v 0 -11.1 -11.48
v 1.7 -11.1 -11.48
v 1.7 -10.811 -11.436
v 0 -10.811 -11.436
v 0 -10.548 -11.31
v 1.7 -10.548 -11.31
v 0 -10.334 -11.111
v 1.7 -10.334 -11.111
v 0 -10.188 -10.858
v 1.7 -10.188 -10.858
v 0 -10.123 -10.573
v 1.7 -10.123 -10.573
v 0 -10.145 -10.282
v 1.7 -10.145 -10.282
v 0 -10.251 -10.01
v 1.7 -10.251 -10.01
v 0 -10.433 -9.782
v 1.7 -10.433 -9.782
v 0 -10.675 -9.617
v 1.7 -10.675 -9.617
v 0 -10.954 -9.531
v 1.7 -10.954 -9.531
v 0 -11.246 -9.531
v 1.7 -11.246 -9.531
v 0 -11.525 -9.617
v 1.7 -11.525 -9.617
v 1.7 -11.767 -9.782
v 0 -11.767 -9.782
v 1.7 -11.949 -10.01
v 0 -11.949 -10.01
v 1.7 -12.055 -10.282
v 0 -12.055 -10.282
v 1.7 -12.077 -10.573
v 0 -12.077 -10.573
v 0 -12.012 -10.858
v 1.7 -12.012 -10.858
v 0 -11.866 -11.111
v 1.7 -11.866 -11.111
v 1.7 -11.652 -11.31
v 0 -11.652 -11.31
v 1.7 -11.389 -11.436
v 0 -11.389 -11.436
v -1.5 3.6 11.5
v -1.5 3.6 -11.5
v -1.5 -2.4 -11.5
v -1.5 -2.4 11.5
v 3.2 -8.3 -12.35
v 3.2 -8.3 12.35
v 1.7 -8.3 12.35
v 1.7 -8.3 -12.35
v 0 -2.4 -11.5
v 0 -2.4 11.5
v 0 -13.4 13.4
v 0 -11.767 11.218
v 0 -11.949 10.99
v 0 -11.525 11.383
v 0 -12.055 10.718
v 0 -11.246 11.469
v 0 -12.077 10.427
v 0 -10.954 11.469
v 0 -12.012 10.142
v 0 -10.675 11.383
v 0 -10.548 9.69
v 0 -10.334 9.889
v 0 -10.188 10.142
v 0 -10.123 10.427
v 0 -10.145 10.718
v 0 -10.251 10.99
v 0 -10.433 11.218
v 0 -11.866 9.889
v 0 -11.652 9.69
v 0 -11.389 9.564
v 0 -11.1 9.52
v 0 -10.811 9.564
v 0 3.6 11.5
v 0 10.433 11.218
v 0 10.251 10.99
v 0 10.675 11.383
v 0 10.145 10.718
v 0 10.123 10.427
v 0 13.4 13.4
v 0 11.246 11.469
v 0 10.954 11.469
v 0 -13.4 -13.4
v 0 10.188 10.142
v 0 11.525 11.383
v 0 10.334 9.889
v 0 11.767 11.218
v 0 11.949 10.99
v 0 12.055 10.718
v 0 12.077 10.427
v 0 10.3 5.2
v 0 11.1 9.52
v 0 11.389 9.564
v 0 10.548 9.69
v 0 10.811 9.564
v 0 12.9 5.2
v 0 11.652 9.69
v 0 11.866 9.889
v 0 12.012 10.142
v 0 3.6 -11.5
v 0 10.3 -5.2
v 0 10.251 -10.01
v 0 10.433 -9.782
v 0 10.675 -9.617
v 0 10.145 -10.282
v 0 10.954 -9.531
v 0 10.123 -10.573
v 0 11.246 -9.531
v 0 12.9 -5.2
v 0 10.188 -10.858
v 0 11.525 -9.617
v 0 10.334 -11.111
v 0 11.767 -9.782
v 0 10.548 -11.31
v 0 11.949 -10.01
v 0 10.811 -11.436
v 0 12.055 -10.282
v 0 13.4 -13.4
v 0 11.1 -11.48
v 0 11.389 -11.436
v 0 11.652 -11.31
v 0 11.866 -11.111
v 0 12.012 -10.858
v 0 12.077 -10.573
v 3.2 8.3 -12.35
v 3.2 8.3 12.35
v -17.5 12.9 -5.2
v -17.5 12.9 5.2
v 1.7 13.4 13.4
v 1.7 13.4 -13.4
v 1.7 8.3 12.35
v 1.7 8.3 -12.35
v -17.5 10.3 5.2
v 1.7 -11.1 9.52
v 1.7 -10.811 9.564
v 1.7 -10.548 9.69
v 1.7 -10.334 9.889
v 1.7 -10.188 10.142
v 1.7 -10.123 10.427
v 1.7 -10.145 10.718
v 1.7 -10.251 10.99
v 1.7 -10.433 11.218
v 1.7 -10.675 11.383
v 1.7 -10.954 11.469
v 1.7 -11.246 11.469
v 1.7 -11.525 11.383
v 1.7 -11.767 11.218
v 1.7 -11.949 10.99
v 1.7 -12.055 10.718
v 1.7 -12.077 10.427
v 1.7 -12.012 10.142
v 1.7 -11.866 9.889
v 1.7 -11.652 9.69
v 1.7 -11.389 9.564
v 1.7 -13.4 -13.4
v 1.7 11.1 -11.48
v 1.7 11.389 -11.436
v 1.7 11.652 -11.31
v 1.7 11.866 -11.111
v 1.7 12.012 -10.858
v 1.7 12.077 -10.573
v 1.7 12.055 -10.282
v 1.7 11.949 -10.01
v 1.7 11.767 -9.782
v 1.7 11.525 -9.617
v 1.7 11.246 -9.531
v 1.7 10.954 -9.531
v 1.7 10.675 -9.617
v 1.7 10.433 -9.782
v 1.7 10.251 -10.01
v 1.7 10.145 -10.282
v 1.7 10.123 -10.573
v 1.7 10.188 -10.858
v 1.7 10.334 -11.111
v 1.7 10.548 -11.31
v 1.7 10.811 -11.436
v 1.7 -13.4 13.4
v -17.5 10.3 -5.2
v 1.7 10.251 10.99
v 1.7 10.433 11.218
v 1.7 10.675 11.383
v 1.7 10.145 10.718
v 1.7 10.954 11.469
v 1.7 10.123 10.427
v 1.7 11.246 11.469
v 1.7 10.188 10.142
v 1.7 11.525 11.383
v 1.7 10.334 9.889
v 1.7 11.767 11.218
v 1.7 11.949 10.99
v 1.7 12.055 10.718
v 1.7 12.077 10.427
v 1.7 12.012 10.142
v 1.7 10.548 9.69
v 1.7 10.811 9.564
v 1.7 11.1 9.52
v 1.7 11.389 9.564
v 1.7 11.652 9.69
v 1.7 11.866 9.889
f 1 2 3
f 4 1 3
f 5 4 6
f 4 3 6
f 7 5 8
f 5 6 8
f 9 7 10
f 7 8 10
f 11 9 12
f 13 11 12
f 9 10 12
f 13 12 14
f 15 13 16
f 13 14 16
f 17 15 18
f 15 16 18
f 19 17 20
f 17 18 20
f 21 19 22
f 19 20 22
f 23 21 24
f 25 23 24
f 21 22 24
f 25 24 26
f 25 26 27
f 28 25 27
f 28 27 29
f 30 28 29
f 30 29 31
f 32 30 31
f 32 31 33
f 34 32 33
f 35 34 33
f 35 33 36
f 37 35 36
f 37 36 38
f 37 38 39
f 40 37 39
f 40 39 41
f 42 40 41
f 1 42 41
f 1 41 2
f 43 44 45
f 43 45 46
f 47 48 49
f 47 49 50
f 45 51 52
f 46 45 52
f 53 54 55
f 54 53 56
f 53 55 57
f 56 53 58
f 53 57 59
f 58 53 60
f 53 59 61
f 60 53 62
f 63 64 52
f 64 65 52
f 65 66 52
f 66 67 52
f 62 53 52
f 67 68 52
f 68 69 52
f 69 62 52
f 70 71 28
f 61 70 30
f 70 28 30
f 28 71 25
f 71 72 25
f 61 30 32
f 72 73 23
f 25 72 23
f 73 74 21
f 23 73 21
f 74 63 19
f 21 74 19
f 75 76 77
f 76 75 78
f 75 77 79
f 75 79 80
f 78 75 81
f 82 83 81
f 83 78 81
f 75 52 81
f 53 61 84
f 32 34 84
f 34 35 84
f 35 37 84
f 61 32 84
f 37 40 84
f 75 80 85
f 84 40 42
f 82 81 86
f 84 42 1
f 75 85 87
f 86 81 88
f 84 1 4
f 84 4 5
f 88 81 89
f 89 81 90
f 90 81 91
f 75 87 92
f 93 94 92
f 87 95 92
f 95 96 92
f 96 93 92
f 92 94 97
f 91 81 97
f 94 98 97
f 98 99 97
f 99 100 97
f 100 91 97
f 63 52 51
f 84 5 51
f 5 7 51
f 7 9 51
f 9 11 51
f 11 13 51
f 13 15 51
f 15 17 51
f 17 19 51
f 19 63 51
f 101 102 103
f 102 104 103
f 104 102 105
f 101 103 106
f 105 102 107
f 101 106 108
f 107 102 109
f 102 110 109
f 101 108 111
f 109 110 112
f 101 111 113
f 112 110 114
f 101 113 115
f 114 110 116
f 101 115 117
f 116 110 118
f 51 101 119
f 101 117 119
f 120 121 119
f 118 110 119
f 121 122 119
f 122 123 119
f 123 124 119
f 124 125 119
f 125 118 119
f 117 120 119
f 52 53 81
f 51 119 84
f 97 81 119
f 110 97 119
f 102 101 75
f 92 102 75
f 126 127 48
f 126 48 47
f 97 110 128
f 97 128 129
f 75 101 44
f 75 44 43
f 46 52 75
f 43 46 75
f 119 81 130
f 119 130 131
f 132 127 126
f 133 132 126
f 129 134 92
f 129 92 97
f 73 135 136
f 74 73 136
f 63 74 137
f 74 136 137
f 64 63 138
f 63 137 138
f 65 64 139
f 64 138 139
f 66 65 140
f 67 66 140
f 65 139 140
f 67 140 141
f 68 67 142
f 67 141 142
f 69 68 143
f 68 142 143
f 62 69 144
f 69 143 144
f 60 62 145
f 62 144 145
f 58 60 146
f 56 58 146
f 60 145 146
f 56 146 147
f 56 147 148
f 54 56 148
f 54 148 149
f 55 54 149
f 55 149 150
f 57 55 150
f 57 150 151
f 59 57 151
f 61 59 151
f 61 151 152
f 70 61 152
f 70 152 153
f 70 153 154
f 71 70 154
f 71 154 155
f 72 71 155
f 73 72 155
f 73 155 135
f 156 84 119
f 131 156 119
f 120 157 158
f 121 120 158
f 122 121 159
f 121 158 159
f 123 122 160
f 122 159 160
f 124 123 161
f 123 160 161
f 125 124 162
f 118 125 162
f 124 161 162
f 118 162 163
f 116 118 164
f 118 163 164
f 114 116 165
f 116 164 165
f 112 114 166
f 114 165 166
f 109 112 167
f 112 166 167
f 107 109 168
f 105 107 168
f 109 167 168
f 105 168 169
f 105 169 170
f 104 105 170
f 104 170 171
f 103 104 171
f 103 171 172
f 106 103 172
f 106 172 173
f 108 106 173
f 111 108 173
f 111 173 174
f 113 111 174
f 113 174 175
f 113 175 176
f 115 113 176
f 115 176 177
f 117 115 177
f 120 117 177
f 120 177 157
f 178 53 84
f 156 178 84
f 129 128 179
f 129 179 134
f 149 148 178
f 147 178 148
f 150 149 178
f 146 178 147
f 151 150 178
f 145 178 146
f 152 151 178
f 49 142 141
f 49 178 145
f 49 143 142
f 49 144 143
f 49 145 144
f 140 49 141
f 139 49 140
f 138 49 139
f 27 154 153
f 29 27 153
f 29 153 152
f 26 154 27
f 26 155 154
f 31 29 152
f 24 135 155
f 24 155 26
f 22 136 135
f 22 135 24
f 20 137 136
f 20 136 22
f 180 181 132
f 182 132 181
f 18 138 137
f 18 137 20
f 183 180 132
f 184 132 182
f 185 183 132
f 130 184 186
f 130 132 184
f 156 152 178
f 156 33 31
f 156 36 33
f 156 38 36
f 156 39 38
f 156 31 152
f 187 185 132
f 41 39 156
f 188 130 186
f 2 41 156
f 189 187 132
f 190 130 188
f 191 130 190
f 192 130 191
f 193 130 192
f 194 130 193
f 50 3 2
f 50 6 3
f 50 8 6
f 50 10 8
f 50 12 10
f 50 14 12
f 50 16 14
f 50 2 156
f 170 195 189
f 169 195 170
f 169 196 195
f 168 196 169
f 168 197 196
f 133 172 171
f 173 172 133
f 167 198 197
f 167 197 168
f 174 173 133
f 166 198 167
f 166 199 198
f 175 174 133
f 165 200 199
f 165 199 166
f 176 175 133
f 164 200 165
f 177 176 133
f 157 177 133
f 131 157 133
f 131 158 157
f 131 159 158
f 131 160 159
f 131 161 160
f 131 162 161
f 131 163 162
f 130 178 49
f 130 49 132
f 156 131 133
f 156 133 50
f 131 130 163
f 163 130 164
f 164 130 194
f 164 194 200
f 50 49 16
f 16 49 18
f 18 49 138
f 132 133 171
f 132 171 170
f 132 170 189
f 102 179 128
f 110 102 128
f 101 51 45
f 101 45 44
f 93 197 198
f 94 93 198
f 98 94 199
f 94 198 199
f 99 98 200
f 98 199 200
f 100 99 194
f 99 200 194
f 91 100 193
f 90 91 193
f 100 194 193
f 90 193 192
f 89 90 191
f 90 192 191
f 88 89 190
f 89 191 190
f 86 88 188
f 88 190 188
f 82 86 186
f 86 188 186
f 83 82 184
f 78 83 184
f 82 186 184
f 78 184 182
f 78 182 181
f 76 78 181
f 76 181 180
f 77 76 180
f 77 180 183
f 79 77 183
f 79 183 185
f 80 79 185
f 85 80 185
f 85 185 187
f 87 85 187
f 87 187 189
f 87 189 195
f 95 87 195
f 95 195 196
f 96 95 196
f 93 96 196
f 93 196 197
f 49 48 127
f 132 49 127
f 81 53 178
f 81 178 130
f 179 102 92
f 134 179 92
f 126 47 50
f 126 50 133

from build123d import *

# Parameters (mm, degrees)
SKETCH_1_W          = 26.8
SKETCH_1_H          = 26.8
EXTRUDE_1_DEPTH     = 3.2
SKETCH_2_W          = 26.8
SKETCH_2_H          = 26.8
SKETCH_2_W_2        = 24.7
SKETCH_2_H_2        = 16.6
CUT_EXTRUDE_1_DEPTH = 1.5
SKETCH_3_W          = 10.4
SKETCH_3_H          = 2.6
EXTRUDE_2_DEPTH     = 17.5
SKETCH_4_W          = 23
SKETCH_4_H          = 6
EXTRUDE_3_DEPTH     = 1.5
SKETCH_5_R          = 0.98
CUT_EXTRUDE_2_DEPTH = 10


with BuildPart() as part:
    # 草图1 → 凸台-拉伸1 (new body)
    with BuildSketch(Plane(origin=(0, 0, 0), x_dir=(0, 0, -1), z_dir=(1, 0, 0))):
        Rectangle(SKETCH_1_W, SKETCH_1_H)
    extrude(amount=EXTRUDE_1_DEPTH)

    # 草图2 → 切除-拉伸1 (cut)
    with BuildSketch(Plane(origin=(3.2, 0, 0), x_dir=(0, 0, -1), z_dir=(1, 0, 0))):
        Rectangle(SKETCH_2_W, SKETCH_2_H)
        Rectangle(SKETCH_2_W_2, SKETCH_2_H_2, mode=Mode.SUBTRACT)
    extrude(amount=-CUT_EXTRUDE_1_DEPTH, mode=Mode.SUBTRACT)

    # 草图3 → 凸台-拉伸2 (add)
    with BuildSketch(Plane.ZY):
        with Locations((0, 11.6)):
            Rectangle(SKETCH_3_W, SKETCH_3_H)
    extrude(amount=EXTRUDE_2_DEPTH)

    # 草图4 → 凸台-拉伸3 (add)
    with BuildSketch(Plane.ZY):
        with Locations((0, 0.6)):
            Rectangle(SKETCH_4_W, SKETCH_4_H)
    extrude(amount=EXTRUDE_3_DEPTH)

    # 草图5 → 切除-拉伸2 (cut)
    with BuildSketch(Plane(origin=(1.7, 0, 0), x_dir=(0, 0, -1), z_dir=(1, 0, 0))):
        with Locations((-10.5, 11.1)):
            Circle(SKETCH_5_R)
        with Locations((10.5, 11.1)):
            Circle(SKETCH_5_R)
        with Locations((10.5, -11.1)):
            Circle(SKETCH_5_R)
        with Locations((-10.5, -11.1)):
            Circle(SKETCH_5_R)
    extrude(amount=-CUT_EXTRUDE_2_DEPTH, mode=Mode.SUBTRACT)


solid = part.part
